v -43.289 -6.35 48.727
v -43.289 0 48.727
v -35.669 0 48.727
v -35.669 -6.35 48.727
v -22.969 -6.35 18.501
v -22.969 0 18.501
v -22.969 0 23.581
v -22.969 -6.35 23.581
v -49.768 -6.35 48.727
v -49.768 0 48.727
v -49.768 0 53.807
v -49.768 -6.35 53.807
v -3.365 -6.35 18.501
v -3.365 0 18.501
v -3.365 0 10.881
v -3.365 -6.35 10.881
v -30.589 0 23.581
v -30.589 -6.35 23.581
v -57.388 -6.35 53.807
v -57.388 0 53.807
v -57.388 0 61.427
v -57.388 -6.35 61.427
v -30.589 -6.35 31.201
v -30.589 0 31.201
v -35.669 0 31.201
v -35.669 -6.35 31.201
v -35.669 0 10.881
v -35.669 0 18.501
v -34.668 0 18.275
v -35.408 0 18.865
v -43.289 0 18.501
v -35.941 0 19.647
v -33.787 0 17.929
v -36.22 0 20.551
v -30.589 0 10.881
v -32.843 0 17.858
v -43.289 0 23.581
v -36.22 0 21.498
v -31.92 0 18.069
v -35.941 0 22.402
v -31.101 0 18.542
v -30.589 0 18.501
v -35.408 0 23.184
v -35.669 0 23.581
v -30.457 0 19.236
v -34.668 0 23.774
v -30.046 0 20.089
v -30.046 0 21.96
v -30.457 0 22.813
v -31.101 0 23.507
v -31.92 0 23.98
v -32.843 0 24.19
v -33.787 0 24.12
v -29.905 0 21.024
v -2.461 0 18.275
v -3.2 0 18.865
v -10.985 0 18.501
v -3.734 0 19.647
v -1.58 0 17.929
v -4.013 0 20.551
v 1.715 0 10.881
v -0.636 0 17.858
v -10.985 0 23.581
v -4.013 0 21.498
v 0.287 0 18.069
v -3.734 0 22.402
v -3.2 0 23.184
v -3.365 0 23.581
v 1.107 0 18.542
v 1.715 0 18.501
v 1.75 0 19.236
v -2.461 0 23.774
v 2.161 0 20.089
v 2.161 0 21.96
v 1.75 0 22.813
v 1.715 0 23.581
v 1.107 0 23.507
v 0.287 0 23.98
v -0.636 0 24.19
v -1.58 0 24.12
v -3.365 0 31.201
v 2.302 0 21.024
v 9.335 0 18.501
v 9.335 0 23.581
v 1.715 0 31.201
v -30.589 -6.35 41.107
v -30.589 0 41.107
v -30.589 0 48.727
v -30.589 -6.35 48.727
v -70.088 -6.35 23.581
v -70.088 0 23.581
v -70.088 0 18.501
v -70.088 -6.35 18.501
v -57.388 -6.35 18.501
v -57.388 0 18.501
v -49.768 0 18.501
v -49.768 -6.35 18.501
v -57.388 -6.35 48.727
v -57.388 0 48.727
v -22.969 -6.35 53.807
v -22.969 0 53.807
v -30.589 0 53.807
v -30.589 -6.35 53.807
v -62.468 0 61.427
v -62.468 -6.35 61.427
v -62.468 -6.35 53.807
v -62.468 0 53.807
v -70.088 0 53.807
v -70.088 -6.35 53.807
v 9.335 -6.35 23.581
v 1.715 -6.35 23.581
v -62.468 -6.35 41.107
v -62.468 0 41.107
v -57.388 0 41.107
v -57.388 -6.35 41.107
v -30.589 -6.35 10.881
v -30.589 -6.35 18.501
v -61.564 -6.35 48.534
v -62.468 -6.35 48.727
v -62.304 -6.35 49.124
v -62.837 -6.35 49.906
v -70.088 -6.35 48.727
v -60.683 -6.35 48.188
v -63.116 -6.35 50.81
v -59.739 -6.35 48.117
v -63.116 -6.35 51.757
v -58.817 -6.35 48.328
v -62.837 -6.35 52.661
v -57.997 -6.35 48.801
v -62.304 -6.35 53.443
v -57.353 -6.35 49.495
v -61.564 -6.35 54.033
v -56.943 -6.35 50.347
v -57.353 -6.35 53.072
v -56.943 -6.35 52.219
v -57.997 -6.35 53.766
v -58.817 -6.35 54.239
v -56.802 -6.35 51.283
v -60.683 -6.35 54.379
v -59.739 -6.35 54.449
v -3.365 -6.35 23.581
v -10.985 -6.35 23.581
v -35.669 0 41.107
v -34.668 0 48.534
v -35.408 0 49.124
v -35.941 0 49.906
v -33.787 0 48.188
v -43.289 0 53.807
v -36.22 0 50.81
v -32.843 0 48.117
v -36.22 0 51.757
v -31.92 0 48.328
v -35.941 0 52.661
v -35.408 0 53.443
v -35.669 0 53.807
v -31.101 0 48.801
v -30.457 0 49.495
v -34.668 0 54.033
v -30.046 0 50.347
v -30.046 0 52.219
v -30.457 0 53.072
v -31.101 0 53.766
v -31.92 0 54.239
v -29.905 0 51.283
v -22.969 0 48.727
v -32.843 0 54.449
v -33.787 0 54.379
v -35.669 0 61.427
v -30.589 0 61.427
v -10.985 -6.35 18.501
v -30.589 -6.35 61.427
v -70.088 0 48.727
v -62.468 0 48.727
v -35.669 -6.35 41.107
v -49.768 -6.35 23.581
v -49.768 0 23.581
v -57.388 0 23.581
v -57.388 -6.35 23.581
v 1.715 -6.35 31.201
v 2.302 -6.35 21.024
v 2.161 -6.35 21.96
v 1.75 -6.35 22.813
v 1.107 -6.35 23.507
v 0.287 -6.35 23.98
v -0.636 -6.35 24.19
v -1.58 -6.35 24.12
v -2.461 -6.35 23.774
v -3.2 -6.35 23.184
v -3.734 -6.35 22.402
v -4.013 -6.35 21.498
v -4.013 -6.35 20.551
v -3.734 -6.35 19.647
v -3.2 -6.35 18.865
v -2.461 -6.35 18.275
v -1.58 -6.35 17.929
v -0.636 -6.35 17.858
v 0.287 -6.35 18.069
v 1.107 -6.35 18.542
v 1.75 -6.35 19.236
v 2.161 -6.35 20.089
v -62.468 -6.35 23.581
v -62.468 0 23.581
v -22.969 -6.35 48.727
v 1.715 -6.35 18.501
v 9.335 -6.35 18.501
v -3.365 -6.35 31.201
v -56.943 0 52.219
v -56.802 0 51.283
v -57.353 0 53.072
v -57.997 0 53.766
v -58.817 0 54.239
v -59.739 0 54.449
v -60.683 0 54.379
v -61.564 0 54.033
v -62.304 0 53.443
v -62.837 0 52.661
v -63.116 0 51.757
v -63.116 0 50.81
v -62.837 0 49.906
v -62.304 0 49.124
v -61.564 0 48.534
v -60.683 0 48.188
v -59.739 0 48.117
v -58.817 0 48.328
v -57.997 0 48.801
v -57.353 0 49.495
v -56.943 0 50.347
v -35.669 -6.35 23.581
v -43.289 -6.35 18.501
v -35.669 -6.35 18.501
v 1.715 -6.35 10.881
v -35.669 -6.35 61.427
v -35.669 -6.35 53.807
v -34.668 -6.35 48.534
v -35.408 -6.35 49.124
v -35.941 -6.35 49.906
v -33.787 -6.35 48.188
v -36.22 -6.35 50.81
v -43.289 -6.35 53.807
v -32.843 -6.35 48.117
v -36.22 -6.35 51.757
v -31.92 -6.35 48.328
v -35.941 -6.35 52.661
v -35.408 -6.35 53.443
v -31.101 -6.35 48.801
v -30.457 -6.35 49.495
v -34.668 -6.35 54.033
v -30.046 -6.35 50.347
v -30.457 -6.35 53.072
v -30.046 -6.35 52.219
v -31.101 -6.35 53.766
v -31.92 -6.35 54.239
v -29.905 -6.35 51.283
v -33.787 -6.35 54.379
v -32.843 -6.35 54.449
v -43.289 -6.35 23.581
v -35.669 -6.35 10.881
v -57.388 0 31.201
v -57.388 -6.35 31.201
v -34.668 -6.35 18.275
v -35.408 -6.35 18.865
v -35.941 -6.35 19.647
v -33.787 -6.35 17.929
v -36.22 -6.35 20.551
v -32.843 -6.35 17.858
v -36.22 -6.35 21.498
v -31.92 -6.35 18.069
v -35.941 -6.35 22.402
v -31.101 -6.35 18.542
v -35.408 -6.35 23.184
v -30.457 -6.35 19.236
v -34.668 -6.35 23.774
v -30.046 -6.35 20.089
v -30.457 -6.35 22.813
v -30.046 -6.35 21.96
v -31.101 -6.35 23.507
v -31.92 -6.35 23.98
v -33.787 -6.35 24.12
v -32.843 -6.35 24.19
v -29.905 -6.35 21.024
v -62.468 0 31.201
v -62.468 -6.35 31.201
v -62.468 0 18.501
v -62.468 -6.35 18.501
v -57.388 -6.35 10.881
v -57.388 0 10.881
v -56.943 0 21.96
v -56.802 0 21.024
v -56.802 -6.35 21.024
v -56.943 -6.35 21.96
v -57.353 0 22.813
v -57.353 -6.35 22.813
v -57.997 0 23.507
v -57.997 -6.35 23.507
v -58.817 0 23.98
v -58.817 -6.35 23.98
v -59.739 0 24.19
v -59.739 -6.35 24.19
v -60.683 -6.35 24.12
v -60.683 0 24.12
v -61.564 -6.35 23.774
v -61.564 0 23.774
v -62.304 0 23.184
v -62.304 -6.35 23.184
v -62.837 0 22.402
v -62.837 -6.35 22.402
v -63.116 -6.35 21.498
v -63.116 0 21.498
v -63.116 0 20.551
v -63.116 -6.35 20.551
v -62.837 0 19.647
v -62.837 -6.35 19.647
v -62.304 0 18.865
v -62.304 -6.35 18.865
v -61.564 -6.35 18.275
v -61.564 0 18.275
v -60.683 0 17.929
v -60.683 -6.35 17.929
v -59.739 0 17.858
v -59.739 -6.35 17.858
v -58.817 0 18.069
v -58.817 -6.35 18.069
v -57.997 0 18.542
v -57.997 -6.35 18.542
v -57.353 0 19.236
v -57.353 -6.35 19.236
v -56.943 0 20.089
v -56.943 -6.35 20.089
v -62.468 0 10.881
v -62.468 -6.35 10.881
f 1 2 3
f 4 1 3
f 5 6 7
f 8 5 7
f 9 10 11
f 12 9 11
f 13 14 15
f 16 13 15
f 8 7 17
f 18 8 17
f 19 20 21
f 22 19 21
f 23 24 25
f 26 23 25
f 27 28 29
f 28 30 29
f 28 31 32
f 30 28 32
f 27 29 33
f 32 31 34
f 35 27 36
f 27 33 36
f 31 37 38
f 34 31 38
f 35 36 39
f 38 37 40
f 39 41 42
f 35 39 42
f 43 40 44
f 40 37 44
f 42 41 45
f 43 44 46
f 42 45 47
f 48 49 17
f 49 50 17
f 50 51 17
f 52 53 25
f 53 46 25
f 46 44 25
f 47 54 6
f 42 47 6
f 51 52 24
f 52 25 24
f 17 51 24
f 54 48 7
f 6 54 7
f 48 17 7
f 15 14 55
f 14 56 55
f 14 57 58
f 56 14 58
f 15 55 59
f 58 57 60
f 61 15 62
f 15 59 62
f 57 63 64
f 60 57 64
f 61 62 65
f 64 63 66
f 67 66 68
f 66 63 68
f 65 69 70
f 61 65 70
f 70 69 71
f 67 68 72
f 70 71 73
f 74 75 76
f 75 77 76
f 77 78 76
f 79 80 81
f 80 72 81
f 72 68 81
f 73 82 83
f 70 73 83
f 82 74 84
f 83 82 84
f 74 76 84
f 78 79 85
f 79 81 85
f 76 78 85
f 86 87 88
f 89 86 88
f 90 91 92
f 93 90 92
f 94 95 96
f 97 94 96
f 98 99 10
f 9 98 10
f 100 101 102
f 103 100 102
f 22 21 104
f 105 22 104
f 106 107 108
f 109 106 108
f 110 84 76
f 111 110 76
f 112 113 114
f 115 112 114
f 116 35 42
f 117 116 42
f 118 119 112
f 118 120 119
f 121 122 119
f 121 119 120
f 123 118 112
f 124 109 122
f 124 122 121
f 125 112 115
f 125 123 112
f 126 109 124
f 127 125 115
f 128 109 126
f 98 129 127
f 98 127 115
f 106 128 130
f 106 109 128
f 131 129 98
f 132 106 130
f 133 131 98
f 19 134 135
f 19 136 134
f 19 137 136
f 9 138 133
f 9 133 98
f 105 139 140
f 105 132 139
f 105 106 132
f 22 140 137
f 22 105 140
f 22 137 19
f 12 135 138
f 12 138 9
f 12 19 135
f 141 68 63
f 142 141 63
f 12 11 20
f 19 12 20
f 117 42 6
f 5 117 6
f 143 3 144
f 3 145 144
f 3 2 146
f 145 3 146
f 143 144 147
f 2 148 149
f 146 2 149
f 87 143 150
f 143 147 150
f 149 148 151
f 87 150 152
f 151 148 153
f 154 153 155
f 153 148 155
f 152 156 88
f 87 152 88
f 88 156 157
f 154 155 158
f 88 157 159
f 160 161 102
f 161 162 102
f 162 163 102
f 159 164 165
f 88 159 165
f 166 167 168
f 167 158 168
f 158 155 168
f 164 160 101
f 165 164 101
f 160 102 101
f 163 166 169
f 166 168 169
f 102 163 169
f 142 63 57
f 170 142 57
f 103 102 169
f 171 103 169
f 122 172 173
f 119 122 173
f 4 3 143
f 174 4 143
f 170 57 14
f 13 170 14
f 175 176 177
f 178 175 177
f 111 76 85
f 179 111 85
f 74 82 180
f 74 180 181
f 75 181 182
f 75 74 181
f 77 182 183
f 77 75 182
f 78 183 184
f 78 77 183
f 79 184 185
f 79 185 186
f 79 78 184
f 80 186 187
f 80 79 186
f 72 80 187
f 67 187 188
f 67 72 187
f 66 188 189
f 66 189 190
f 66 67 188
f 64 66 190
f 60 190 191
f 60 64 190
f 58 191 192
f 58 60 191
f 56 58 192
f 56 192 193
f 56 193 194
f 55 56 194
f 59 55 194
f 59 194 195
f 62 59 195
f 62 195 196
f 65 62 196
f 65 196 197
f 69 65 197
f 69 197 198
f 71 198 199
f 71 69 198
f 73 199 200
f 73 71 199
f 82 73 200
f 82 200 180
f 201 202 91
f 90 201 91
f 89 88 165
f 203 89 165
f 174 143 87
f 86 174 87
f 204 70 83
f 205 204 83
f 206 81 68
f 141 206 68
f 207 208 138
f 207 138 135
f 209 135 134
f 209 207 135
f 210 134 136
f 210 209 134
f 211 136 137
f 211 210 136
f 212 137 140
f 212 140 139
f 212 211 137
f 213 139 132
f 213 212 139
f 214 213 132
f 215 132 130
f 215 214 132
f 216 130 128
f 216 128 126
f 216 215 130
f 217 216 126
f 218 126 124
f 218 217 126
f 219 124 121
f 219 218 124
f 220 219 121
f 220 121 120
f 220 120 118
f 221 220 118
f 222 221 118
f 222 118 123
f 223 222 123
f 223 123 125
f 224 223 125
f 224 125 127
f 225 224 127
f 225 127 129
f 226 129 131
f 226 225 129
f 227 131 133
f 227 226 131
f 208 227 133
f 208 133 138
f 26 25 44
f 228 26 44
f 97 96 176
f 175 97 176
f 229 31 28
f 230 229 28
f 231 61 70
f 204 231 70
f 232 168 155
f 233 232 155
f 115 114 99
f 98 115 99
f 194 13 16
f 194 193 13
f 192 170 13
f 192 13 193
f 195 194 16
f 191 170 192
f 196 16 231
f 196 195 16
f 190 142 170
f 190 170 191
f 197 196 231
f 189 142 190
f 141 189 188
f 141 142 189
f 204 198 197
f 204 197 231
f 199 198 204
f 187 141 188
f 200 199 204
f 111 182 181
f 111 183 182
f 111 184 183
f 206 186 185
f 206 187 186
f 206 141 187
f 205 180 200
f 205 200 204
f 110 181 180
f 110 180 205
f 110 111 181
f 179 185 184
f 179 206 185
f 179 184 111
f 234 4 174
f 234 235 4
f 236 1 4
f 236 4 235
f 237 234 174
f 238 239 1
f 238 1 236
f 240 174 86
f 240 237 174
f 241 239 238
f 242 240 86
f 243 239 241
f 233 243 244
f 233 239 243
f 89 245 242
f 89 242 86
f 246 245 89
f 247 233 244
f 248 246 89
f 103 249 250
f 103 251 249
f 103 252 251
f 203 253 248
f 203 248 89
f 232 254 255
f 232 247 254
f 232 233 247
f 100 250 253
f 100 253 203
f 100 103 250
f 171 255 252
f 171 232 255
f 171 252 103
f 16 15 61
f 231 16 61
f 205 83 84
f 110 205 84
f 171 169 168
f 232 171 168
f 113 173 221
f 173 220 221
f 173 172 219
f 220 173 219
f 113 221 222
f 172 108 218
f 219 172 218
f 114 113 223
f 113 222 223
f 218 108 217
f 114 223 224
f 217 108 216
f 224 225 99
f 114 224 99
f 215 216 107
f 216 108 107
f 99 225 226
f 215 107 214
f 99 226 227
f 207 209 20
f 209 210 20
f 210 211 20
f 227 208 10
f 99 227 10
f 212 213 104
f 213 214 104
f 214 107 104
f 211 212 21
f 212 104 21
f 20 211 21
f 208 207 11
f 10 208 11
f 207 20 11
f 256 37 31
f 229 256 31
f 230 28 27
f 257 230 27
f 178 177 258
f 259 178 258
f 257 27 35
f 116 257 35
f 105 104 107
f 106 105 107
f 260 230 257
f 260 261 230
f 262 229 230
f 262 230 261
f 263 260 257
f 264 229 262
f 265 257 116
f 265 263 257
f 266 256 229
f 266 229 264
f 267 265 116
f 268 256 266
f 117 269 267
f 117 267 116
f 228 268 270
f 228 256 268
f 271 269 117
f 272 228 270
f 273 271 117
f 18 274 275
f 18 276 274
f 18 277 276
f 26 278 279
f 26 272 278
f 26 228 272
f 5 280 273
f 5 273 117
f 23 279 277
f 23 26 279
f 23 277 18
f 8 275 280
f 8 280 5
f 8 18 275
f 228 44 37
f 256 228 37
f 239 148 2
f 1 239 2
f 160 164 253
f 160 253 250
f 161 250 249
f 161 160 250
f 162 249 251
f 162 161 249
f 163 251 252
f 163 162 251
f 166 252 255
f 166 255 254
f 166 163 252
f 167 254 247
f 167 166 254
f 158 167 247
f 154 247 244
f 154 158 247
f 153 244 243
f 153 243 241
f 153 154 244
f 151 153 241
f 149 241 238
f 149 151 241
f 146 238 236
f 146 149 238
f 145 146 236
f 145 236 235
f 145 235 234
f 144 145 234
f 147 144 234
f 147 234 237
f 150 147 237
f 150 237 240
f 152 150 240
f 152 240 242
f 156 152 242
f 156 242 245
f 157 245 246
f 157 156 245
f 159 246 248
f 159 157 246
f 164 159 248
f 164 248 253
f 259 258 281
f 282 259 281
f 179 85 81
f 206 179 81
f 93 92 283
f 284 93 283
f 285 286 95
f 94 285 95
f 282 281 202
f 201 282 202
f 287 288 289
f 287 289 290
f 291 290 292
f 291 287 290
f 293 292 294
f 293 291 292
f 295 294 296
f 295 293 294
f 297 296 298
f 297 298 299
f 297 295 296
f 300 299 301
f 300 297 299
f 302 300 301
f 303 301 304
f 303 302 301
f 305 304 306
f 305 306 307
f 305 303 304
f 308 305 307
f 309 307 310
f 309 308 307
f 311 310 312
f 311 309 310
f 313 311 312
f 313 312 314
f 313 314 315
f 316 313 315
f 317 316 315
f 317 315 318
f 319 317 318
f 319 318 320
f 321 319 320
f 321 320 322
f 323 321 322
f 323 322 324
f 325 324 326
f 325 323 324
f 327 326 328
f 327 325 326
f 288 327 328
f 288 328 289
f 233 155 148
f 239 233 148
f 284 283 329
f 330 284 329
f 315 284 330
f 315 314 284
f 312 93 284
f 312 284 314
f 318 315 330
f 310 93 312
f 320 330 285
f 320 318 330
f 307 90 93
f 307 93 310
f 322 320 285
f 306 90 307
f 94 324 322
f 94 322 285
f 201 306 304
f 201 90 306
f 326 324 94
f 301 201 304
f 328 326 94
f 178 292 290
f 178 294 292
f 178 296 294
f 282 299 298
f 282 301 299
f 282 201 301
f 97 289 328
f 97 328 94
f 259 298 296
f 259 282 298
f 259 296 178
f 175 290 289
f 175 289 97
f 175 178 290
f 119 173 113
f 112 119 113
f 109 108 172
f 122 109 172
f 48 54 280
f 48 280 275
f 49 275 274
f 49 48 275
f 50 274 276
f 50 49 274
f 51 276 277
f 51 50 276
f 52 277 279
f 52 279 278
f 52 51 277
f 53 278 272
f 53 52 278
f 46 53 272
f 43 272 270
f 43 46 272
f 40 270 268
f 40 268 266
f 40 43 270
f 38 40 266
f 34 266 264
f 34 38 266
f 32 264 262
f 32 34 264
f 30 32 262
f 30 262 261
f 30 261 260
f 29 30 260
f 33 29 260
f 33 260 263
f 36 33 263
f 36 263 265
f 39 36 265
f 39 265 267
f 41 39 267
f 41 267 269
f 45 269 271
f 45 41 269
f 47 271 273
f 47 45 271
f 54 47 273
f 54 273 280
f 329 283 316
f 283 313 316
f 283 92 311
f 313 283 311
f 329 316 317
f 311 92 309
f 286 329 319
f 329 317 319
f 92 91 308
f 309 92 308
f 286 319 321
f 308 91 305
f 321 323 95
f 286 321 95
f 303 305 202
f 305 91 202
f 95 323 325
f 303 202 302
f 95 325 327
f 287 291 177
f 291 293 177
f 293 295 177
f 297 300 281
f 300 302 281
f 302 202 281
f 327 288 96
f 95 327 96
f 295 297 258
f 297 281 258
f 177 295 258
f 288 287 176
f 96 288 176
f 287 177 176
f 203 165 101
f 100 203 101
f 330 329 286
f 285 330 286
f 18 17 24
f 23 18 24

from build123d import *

# Parameters (mm, degrees)
F0_R     = 3.175
F1_DEPTH = 6.35
F2_DEPTH = 6.35


with BuildPart() as f1:
    # F0 (on Front) → F1 (new body)
    with BuildSketch(Plane.XZ):
        Polygon((-57.38823, 61.426864), (-62.46823, 61.426864), (-62.46823, 53.806864), (-70.08823, 53.806864), (-70.08823, 48.726864), (-62.46823, 48.726864), (-62.46823, 41.106864), (-57.38823, 41.106864), (-57.38823, 48.726864), (-49.76823, 48.726864), (-49.76823, 53.806864), (-57.38823, 53.806864), align=None)
        with Locations((-59.976693, 51.2833)):
            Circle(F0_R, mode=Mode.SUBTRACT)
    extrude(amount=F1_DEPTH)


with BuildPart() as f2:
    # F0 (on Front) → F2 (new body)
    with BuildSketch(Plane.XZ):
        Polygon((-43.28859, 53.806864), (-43.28859, 48.726864), (-35.66859, 48.726864), (-35.66859, 41.106864), (-30.58859, 41.106864), (-30.58859, 48.726864), (-22.96859, 48.726864), (-22.96859, 53.806864), (-30.58859, 53.806864), (-30.58859, 61.426864), (-35.66859, 61.426864), (-35.66859, 53.806864), align=None)
        with Locations((-33.080127, 51.2833)):
            Circle(F0_R, mode=Mode.SUBTRACT)
        Polygon((-49.76823, 18.500804), (-49.76823, 23.580804), (-57.38823, 23.580804), (-57.38823, 31.200804), (-62.46823, 31.200804), (-62.46823, 23.580804), (-70.08823, 23.580804), (-70.08823, 18.500804), (-62.46823, 18.500804), (-62.46823, 10.880804), (-57.38823, 10.880804), (-57.38823, 18.500804), align=None)
        with Locations((-59.976693, 21.024369)):
            Circle(F0_R, mode=Mode.SUBTRACT)
        Polygon((-30.58859, 31.200804), (-35.66859, 31.200804), (-35.66859, 23.580804), (-43.28859, 23.580804), (-43.28859, 18.500804), (-35.66859, 18.500804), (-35.66859, 10.880804), (-30.58859, 10.880804), (-30.58859, 18.500804), (-22.96859, 18.500804), (-22.96859, 23.580804), (-30.58859, 23.580804), align=None)
        with Locations((-33.080127, 21.024369)):
            Circle(F0_R, mode=Mode.SUBTRACT)
        Polygon((-10.98457, 23.580804), (-10.98457, 18.500804), (-3.36457, 18.500804), (-3.36457, 10.880804), (1.71543, 10.880804), (1.71543, 18.500804), (9.33543, 18.500804), (9.33543, 23.580804), (1.71543, 23.580804), (1.71543, 31.200804), (-3.36457, 31.200804), (-3.36457, 23.580804), align=None)
        with Locations((-0.873033, 21.024369)):
            Circle(F0_R, mode=Mode.SUBTRACT)
    extrude(amount=F2_DEPTH)


solid = Compound([f1.part, f2.part])
